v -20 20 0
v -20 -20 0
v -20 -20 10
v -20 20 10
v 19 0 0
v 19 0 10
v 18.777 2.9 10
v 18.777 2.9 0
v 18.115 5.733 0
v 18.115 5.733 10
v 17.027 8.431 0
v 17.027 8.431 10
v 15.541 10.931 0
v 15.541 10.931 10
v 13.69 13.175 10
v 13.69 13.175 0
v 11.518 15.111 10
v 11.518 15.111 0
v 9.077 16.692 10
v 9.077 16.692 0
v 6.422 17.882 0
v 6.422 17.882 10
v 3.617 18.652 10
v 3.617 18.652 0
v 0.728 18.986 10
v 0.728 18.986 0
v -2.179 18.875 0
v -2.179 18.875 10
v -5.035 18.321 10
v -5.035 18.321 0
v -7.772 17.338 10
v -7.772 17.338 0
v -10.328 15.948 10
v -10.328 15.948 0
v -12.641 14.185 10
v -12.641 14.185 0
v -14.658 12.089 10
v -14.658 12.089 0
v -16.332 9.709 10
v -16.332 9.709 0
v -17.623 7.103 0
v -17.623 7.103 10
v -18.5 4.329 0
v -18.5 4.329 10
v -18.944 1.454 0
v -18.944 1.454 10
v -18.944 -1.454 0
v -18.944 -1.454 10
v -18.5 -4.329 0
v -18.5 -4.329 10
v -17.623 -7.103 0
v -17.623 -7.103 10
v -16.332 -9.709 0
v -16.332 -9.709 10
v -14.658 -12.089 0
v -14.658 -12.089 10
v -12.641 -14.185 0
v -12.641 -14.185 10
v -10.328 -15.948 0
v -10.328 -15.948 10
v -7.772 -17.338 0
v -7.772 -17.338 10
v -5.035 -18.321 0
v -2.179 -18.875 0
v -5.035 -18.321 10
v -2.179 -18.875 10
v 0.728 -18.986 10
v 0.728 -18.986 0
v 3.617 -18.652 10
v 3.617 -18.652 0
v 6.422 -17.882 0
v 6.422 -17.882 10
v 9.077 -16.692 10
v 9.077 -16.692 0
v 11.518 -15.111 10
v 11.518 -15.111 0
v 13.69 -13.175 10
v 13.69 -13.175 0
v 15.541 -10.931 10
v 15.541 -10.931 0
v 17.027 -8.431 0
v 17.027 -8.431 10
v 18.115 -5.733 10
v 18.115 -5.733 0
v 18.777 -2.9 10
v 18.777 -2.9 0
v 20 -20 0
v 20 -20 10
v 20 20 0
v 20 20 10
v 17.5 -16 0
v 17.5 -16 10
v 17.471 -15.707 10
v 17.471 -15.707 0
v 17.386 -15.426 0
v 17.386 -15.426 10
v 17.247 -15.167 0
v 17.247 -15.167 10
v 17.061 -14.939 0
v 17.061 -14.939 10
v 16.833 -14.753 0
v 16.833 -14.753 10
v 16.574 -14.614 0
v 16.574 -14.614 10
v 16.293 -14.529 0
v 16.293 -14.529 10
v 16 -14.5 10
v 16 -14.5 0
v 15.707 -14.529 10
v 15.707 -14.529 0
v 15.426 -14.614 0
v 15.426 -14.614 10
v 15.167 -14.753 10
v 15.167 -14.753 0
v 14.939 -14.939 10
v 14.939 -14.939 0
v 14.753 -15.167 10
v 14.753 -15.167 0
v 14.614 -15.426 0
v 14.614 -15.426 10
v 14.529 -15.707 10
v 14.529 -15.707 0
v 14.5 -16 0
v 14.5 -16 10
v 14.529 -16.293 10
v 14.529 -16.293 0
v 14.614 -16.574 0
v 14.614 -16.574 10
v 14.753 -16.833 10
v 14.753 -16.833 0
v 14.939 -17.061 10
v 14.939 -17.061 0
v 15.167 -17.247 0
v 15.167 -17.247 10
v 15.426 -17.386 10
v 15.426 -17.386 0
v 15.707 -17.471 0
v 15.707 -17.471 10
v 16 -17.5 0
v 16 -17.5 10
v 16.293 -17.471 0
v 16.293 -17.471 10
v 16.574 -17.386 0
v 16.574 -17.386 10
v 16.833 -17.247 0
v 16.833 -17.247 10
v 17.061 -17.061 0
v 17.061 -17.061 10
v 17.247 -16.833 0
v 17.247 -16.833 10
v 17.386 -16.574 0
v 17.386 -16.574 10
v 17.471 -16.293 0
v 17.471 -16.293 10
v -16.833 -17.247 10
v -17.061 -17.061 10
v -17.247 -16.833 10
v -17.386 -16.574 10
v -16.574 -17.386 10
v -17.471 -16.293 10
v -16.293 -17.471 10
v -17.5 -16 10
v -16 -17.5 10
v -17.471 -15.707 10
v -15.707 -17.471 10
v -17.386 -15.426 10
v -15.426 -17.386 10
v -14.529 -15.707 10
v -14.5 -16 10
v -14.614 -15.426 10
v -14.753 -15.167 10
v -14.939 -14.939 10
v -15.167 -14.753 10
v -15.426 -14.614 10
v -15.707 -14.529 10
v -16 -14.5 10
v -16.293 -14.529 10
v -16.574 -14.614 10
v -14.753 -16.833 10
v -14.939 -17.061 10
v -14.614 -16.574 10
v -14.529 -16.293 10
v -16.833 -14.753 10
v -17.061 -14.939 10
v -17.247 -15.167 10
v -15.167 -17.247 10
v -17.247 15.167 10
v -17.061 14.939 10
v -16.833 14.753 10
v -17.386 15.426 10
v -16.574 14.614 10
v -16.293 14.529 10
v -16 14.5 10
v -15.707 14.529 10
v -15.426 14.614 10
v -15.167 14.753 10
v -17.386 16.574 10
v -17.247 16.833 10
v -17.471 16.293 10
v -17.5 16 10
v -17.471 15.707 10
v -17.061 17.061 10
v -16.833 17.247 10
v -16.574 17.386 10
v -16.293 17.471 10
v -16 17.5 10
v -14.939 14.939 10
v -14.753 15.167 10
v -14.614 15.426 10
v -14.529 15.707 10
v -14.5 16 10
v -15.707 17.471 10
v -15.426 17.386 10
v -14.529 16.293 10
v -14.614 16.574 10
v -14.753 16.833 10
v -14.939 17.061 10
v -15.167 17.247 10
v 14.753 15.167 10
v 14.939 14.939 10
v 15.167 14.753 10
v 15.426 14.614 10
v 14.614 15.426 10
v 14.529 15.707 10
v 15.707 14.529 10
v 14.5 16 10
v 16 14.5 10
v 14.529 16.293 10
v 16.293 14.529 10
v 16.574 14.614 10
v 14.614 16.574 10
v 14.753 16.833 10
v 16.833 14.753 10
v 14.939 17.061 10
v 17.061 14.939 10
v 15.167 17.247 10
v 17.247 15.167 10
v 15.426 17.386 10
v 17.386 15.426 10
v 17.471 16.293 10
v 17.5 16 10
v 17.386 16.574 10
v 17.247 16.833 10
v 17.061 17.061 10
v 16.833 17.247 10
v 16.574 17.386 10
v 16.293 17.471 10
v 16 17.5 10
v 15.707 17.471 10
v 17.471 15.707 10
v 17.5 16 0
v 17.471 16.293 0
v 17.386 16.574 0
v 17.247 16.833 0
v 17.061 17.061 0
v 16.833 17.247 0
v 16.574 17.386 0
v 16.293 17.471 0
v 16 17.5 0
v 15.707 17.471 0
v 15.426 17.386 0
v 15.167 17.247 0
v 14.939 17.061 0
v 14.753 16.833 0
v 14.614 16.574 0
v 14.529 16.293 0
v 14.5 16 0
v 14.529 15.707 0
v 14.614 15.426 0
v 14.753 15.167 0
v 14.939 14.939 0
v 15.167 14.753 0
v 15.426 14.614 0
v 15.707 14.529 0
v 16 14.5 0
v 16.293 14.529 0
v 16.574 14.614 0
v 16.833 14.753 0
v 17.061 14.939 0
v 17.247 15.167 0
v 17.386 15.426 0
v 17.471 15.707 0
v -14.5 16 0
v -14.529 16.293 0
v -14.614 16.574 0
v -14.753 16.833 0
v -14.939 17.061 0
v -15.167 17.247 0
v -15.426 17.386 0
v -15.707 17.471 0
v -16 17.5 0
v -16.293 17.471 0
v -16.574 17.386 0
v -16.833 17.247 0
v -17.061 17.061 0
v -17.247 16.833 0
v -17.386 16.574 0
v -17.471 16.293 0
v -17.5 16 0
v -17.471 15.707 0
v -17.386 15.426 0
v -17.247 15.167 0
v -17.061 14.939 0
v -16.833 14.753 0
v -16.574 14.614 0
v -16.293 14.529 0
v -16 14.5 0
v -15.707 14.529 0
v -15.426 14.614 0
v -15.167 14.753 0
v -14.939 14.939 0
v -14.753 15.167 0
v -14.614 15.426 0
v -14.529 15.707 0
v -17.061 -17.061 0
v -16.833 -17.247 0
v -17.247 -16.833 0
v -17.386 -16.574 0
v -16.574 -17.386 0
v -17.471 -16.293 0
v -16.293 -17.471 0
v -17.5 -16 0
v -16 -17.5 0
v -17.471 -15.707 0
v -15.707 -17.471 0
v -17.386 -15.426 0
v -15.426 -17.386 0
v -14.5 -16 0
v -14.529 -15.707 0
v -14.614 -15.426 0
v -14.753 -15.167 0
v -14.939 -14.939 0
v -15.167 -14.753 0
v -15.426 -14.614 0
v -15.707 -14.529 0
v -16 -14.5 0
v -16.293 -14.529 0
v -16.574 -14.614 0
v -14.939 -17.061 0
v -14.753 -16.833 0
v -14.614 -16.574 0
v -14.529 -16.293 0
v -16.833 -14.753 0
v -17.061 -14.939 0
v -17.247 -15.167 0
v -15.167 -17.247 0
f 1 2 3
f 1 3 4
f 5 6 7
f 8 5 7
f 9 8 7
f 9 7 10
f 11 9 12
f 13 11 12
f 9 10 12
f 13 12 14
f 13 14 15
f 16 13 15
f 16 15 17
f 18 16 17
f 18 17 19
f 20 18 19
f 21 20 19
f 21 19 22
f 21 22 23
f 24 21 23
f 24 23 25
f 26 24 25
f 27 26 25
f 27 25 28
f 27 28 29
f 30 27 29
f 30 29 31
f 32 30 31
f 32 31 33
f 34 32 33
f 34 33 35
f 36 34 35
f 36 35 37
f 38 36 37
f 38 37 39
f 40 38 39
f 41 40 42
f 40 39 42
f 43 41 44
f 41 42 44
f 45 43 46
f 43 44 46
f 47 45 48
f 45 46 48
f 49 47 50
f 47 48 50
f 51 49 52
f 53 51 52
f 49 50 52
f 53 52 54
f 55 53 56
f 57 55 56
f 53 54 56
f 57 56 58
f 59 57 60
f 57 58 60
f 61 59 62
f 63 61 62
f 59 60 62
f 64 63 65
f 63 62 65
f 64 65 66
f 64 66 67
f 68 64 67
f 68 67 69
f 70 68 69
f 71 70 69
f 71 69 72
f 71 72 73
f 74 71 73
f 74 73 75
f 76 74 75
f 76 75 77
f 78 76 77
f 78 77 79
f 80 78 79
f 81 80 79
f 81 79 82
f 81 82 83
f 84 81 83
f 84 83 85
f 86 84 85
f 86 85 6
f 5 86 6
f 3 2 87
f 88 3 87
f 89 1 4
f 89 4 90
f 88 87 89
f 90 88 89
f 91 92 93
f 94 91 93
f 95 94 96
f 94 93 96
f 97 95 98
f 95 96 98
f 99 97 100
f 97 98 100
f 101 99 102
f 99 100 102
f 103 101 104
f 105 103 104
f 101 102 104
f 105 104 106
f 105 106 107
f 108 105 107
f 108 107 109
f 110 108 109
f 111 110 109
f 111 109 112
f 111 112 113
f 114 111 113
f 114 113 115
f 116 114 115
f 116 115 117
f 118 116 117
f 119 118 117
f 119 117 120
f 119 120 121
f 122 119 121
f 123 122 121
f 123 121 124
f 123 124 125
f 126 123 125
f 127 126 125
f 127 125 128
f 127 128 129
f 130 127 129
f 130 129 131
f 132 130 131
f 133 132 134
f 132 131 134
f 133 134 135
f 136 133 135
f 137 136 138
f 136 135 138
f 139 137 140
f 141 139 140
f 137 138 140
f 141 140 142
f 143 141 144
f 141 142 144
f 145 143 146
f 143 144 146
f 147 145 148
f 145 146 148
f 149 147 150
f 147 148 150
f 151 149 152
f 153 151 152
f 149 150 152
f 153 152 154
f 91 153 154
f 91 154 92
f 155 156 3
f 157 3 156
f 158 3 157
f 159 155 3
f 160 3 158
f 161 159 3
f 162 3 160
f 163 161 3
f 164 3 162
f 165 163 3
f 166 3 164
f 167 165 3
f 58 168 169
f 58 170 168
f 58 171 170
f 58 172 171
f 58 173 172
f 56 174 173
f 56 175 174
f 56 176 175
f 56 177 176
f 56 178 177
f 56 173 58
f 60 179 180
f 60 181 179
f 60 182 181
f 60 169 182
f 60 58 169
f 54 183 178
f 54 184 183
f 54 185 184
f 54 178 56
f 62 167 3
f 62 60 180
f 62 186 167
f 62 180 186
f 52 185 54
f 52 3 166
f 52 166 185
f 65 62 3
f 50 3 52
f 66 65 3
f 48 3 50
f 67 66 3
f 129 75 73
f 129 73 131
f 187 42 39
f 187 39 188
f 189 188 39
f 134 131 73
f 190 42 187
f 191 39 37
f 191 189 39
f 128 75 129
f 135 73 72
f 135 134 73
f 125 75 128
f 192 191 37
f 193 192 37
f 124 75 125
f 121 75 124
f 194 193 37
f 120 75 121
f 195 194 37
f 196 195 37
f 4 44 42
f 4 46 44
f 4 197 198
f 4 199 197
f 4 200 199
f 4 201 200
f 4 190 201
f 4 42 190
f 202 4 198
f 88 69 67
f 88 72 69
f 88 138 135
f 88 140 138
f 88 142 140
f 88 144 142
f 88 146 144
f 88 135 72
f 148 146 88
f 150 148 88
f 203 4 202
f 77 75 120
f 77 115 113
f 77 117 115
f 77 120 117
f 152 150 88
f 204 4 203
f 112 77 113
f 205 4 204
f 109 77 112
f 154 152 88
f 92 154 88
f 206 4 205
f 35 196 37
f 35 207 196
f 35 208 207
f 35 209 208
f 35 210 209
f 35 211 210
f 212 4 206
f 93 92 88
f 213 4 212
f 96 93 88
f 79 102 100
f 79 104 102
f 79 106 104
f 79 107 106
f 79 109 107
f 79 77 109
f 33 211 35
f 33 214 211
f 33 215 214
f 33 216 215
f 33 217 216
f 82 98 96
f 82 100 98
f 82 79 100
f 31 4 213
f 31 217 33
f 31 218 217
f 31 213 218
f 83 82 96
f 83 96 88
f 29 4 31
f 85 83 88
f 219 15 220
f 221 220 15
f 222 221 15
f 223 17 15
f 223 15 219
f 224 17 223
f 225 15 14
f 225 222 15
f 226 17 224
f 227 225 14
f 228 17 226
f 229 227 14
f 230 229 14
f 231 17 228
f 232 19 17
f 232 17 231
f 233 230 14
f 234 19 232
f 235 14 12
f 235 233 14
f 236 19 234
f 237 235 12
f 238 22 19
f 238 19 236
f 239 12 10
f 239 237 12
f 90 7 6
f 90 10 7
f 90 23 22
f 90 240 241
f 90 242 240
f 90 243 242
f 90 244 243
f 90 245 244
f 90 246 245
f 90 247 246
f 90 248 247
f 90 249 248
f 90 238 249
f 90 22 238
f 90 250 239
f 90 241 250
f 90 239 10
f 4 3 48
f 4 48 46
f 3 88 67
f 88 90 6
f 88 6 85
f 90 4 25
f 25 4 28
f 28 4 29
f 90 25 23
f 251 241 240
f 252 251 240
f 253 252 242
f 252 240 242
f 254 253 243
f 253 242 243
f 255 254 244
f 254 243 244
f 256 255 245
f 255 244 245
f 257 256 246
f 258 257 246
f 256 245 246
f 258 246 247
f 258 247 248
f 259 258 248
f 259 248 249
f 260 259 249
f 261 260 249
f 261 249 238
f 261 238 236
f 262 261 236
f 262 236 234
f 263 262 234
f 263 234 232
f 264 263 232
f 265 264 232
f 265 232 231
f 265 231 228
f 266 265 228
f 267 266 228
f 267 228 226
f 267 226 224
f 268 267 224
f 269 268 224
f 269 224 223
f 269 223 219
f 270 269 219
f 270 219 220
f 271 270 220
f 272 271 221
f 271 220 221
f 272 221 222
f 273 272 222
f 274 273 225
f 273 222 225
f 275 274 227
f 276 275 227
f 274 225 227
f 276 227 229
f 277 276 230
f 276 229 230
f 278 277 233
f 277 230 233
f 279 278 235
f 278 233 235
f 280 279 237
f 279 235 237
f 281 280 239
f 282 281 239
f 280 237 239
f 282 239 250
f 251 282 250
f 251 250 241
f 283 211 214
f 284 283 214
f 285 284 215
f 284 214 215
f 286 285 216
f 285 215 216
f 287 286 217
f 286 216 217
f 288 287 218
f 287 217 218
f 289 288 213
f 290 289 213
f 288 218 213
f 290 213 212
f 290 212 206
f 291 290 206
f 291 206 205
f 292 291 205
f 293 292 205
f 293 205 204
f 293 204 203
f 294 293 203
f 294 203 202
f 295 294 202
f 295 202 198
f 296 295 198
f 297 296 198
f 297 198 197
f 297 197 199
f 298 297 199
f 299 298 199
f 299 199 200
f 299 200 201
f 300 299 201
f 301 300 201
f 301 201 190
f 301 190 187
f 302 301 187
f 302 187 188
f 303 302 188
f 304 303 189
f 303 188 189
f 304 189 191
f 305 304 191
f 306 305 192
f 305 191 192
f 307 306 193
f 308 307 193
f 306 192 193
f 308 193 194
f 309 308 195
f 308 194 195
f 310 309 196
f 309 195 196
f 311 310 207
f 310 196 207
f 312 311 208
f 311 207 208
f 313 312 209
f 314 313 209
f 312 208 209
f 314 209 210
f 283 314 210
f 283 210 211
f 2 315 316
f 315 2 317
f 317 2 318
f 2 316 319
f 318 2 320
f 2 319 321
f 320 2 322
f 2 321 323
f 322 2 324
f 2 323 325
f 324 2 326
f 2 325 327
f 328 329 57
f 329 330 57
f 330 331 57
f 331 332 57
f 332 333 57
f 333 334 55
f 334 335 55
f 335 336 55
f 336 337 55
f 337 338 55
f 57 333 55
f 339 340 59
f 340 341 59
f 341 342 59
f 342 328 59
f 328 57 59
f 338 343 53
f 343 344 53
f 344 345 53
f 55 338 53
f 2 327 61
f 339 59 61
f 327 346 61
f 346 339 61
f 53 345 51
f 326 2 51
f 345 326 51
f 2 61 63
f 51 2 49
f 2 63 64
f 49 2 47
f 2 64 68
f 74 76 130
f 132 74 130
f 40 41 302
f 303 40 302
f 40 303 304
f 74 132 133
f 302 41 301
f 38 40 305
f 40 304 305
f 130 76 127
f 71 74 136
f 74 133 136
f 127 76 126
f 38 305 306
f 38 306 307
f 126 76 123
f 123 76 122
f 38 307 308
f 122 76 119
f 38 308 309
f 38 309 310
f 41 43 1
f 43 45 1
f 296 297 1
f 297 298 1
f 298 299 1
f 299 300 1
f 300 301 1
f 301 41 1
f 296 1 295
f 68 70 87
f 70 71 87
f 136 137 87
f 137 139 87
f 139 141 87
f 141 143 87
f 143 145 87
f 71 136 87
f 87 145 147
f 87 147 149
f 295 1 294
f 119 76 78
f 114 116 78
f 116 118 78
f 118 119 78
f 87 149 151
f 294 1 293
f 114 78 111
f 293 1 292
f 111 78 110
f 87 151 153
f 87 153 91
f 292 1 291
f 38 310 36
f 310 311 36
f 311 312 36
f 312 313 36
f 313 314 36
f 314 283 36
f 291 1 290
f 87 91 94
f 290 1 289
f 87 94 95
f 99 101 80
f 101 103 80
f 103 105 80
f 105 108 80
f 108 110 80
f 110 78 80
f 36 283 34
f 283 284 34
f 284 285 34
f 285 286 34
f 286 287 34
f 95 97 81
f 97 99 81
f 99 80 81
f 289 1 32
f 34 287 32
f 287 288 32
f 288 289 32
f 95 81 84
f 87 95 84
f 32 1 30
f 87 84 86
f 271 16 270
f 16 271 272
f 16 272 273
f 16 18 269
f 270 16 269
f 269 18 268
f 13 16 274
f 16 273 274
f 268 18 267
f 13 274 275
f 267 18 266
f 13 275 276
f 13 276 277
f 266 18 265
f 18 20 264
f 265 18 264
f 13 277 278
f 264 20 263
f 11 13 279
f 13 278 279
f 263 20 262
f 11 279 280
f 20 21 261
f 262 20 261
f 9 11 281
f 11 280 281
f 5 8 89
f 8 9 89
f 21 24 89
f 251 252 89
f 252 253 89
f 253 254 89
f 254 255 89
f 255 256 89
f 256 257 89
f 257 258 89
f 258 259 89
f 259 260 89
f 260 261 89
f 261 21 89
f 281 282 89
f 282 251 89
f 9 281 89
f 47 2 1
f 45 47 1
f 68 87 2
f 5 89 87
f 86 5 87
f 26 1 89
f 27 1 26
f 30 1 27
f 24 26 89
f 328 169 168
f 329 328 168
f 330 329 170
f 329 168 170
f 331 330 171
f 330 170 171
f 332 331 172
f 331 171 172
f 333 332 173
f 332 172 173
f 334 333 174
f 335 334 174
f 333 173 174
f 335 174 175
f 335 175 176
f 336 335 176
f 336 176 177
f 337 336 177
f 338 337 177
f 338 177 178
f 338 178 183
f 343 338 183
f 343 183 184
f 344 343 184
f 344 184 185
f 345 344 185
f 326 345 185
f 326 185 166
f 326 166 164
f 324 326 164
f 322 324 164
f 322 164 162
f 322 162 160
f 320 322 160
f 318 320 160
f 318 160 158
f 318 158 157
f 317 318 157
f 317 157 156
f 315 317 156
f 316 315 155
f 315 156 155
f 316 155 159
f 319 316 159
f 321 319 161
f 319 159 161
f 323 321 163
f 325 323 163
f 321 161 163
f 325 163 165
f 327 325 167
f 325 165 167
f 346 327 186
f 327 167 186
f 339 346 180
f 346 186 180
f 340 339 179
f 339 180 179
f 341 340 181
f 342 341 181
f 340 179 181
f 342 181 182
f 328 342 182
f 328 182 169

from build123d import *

# Parameters (mm, degrees)
SKETCH_1_W          = 40
SKETCH_1_H          = 40
EXTRUDE_1_DEPTH     = 10
SKETCH_2_R          = 19
CUT_EXTRUDE_1_DEPTH = 31
SKETCH_3_R          = 1.5
CUT_EXTRUDE_2_DEPTH = 31


with BuildPart() as part:
    # 草圖1 → 填料-伸長1 (new body)
    with BuildSketch(Plane.XY):
        Rectangle(SKETCH_1_W, SKETCH_1_H)
    extrude(amount=EXTRUDE_1_DEPTH)

    # 草圖2 → 除料-伸長1 (cut, through all)
    with BuildSketch(Plane.XY.offset(10)):
        Circle(SKETCH_2_R)
    extrude(amount=-CUT_EXTRUDE_1_DEPTH, mode=Mode.SUBTRACT)

    # 草圖3 → 除料-伸長2 (cut, through all)
    with BuildSketch(Plane.XY.offset(10)):
        with Locations((-16, 16)):
            Circle(SKETCH_3_R)
        with Locations((-16, -16)):
            Circle(SKETCH_3_R)
        with Locations((16, -16)):
            Circle(SKETCH_3_R)
        with Locations((16, 16)):
            Circle(SKETCH_3_R)
    extrude(amount=-CUT_EXTRUDE_2_DEPTH, mode=Mode.SUBTRACT)


solid = part.part
